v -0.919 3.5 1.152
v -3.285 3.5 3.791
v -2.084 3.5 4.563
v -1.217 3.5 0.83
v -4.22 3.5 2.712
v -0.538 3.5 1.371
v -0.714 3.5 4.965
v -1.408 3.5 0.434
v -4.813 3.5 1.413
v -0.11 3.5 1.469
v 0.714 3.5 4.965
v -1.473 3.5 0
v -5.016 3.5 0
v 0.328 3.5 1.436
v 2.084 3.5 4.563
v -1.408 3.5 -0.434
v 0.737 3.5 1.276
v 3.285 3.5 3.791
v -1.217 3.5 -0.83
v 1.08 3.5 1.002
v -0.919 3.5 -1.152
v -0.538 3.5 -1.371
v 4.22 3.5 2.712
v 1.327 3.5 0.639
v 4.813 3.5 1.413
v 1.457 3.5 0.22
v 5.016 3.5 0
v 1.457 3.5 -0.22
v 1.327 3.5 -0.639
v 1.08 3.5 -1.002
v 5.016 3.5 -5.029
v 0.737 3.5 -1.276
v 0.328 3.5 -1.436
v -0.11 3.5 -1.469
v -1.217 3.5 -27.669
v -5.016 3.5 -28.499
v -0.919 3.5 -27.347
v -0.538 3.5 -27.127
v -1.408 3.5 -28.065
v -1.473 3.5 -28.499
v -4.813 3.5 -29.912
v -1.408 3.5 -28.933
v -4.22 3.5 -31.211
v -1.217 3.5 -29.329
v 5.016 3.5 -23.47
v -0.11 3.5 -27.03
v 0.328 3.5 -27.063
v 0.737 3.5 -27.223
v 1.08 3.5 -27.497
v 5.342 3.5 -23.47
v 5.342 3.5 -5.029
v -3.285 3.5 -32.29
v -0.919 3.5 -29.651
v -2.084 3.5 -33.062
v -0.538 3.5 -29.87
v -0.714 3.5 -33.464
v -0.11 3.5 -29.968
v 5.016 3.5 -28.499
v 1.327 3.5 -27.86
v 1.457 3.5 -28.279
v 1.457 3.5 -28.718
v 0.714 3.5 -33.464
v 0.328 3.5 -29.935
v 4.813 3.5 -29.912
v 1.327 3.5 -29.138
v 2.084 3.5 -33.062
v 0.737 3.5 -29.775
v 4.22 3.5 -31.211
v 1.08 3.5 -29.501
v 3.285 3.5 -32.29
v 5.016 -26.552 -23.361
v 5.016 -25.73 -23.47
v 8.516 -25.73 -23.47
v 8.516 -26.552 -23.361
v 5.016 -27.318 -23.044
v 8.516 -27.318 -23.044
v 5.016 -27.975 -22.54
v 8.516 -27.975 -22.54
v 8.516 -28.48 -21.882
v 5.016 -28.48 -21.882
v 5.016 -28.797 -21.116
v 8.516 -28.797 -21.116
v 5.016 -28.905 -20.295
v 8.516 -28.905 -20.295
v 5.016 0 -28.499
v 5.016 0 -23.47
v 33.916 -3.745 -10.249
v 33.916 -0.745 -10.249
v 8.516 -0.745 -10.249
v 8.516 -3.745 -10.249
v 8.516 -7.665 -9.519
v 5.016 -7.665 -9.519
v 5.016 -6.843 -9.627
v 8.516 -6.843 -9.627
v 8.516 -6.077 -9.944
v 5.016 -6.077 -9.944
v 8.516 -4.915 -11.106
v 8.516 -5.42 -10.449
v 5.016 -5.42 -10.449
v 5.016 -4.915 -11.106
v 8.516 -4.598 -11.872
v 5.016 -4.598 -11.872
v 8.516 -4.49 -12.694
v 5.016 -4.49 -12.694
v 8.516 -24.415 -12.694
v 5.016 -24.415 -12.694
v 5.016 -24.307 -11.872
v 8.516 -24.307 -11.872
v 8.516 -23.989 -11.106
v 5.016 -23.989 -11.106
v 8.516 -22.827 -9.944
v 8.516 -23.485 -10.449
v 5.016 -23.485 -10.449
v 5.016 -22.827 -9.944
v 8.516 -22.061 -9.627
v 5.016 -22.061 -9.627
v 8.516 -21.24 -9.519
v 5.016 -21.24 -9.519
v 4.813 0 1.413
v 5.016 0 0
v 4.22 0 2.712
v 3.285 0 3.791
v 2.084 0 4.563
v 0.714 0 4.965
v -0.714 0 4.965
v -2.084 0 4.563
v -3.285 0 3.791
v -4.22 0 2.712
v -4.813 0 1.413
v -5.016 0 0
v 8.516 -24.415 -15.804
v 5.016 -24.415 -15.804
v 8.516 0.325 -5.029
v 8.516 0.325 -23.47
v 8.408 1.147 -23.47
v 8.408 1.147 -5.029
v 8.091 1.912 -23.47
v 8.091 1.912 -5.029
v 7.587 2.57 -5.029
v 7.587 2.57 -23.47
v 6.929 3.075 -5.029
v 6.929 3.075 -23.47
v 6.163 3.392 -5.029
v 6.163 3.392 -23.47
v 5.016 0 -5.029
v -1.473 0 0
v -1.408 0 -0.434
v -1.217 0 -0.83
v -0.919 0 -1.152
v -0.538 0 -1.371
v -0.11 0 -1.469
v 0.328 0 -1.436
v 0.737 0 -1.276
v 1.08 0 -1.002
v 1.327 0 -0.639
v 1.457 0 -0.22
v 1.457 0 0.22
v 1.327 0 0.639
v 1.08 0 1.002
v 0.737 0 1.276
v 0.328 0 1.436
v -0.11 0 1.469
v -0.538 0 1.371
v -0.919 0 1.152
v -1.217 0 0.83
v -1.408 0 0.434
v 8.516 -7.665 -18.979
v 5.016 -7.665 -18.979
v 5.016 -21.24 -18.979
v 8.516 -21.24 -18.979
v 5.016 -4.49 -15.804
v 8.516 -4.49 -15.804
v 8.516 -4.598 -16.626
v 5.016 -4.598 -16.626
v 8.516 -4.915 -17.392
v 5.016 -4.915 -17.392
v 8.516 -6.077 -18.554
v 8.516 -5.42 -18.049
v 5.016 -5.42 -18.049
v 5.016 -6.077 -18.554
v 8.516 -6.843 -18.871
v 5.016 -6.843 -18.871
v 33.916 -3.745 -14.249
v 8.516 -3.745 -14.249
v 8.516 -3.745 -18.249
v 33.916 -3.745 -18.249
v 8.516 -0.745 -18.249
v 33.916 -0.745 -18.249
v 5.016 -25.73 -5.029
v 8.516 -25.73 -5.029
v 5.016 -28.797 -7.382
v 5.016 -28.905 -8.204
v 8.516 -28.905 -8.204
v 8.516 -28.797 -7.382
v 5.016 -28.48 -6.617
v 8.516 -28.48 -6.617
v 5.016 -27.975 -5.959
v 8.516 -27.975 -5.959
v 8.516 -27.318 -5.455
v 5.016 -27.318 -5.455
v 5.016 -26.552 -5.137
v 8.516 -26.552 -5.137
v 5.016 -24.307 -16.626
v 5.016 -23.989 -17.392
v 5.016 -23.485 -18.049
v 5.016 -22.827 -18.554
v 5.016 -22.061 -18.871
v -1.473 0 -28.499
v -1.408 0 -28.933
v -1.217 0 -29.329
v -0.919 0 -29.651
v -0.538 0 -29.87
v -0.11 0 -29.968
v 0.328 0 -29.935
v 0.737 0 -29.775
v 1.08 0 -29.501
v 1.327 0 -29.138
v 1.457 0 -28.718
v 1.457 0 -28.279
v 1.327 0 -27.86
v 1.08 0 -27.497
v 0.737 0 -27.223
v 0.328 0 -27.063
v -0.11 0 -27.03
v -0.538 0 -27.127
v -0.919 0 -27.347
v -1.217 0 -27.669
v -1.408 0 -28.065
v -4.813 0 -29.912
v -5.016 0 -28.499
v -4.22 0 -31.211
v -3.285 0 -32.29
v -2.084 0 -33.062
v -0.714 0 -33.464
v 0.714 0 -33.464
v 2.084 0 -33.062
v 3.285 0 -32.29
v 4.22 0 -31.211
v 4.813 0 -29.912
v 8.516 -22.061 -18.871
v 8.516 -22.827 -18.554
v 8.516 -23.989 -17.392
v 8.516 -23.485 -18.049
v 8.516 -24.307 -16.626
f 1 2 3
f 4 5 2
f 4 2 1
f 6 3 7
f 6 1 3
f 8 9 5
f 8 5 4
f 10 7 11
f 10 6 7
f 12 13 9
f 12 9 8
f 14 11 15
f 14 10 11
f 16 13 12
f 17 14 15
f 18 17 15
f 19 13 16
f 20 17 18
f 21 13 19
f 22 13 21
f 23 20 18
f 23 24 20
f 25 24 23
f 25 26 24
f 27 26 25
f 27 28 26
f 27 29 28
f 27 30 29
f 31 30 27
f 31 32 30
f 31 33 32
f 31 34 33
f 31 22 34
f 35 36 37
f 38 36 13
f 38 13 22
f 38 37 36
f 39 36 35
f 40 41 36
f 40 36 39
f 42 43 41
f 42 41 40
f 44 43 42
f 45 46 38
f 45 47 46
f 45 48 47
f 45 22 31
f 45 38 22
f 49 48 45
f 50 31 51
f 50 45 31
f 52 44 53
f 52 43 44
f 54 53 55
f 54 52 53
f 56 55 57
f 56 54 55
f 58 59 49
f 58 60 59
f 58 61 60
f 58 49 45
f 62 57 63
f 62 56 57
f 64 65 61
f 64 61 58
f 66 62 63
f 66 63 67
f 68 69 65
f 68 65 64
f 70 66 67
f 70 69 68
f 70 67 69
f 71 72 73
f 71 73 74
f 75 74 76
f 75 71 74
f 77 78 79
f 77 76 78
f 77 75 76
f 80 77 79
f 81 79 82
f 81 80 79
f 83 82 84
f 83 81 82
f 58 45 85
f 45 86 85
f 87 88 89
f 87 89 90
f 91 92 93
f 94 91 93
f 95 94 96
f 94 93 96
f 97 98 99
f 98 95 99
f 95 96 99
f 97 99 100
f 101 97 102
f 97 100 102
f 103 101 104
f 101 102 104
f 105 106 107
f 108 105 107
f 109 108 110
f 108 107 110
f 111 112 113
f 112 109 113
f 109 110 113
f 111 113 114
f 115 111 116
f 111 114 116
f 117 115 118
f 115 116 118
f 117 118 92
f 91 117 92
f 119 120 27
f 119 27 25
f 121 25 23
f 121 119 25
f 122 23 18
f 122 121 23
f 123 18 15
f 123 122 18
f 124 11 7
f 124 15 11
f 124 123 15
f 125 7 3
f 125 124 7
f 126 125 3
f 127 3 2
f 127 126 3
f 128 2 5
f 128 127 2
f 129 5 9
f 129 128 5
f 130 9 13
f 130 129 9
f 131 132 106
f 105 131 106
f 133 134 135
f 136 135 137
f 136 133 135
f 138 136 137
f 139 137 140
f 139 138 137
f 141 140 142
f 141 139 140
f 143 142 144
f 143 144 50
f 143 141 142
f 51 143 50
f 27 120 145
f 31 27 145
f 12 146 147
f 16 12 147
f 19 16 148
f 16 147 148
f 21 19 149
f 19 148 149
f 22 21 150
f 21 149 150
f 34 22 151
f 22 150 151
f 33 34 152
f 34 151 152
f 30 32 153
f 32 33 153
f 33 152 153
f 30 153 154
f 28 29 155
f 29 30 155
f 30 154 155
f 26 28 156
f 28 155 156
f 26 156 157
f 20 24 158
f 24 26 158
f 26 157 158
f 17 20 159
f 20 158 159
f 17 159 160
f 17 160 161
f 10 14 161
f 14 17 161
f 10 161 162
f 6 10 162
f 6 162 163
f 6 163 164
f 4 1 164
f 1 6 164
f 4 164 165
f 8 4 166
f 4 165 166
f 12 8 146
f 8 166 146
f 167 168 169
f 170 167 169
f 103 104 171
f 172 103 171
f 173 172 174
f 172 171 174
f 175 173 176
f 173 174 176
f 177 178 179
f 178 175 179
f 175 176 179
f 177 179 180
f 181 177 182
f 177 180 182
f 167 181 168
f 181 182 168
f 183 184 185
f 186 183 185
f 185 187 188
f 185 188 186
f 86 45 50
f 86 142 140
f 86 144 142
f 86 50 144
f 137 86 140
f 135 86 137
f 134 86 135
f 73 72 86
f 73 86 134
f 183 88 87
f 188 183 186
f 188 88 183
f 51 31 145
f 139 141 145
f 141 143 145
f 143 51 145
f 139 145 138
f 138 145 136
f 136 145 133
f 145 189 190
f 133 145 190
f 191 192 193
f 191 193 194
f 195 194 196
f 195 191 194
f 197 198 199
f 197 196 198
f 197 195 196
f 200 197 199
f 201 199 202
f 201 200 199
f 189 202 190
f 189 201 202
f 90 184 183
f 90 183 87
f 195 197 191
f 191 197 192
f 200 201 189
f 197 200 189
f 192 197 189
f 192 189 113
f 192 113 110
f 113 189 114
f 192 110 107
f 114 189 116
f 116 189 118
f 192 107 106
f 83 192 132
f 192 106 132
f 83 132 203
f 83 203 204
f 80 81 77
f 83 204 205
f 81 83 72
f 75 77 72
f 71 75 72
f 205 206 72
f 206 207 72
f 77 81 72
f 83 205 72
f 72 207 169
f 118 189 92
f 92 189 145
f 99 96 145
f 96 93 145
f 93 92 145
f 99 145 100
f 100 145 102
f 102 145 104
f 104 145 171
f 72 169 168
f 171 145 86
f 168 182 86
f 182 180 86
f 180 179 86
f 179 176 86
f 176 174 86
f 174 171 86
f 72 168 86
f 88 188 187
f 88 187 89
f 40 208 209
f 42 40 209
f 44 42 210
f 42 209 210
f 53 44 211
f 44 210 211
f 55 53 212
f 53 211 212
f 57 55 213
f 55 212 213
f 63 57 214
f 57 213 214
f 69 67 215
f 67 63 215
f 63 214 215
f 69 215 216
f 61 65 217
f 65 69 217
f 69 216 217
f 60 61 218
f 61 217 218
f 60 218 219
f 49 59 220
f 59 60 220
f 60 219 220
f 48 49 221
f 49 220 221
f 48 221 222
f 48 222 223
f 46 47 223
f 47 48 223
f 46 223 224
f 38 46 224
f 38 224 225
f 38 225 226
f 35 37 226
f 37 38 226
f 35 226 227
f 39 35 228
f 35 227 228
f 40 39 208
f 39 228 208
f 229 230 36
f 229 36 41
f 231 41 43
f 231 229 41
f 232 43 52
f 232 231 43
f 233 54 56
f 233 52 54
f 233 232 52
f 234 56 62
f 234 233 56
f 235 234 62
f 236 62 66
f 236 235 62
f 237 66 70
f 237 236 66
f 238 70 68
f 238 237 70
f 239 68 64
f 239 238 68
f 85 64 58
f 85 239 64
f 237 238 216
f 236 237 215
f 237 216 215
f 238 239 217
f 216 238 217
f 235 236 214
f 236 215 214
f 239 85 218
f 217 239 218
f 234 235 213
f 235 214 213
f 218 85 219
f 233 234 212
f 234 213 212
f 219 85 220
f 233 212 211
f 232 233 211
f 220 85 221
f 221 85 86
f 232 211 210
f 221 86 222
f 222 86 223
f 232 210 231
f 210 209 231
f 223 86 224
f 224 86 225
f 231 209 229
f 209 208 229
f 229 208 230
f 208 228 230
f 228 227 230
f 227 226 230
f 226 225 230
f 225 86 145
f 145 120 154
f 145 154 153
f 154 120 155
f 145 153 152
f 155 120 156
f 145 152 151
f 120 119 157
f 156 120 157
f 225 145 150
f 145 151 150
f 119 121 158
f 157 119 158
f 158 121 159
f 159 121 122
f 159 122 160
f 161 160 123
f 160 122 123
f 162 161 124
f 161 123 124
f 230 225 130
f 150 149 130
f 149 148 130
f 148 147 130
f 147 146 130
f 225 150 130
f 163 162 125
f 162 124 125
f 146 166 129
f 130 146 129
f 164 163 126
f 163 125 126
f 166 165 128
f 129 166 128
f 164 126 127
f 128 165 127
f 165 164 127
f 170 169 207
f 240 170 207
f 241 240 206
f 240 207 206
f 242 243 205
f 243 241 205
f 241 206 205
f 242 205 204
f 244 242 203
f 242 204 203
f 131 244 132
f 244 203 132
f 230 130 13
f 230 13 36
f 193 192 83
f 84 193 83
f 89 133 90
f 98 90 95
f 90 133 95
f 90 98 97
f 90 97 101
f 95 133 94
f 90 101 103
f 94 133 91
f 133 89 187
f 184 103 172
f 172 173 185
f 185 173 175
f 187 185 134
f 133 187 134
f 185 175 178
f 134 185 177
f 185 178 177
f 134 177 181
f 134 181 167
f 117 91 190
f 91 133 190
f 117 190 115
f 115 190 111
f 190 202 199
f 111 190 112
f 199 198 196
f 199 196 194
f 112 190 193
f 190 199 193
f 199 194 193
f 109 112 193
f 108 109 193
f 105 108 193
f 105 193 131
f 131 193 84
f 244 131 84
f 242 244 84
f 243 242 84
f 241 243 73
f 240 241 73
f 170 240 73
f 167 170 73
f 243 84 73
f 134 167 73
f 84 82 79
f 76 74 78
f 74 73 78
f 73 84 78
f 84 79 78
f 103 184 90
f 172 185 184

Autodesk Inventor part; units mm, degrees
ref_plane "YZ Plane" through (0, 0, 0) normal (1, 0, 0) x (0, 1, 0)
ref_plane "XZ Plane" through (0, 0, 0) normal (0, 1, 0) x (-1, 0, 0)
ref_plane "XY Plane" through (0, 0, 0) normal (0, 0, 1) x (1, 0, 0)
sketch "Sketch1" plane through (0, 0, 0) normal (0, 1, 0) x (-1, 0, 0)
  circle A0 centre (0, 0) radius 1.4732
  circle A1 centre (0, -28.4988) radius 1.4732
  circle A2 centre (0, 0) radius 5.0165
  circle A3 centre (0, -28.4988) radius 5.0165
  line L0 (5.0165, 0) -> (5.0165, -28.4988)
  line L1 (-5.0165, 0) -> (-5.0165, -28.4988)
  dimension "d0" = 2.9464
  dimension "d2" = 2.9464
  dimension "d3" = 10.033
  dimension "d4" = 10.033
extrude "Extrusion1" add sketch "Sketch1" along normal blind 3.5
sketch "Sketch2" plane through (5.0165, 0, 0) normal (1, 0, 0) x (0, 0, -1)
  line L0 (0, 0) -> (28.4988, 0) projected
  line L1 (0, 0) -> (5.0292, 0)
  line L2 (28.4988, 0) -> (28.4988, 3.5) projected
  line L3 (28.4988, 0) -> (23.4696, 0)
  line L4 (23.4696, 0) -> (5.0292, 0)
  line L5 (5.0292, 0) -> (5.0292, -25.7302)
  line L6 (8.2042, -28.9052) -> (20.2946, -28.9052)
  line L7 (23.4696, -25.7302) -> (23.4696, 0)
  line L8 (5.0292, 0) -> (23.4696, 0)
  line L9 (5.0292, 0) -> (11.3792, 0)
  line L10 (23.4696, 0) -> (17.1196, 0)
  line L11 (5.0292, -28.9052) -> (11.3792, -28.9052)
  arc A0 (5.0292, -25.7302) -> (8.2042, -28.9052) centre (8.2042, -25.7302) ccw
  arc A1 (20.2946, -28.9052) -> (23.4696, -25.7302) centre (20.2946, -25.7302) ccw
  line L12 (15.8041, -24.4147) -> (12.694, -24.4147)
  line L13 (12.694, -4.4898) -> (15.8041, -4.4898)
  line L14 (18.9791, -7.6648) -> (18.9791, -21.2397)
  line L15 (9.519, -21.2397) -> (9.519, -7.6648)
  arc A2 (12.694, -4.4898) -> (9.519, -7.6648) centre (12.694, -7.6648) ccw
  arc A3 (9.519, -21.2397) -> (12.694, -24.4147) centre (12.694, -21.2397) ccw
  arc A4 (15.8041, -24.4147) -> (18.9791, -21.2397) centre (15.8041, -21.2397) ccw
  arc A5 (18.9791, -7.6648) -> (15.8041, -4.4898) centre (15.8041, -7.6648) ccw
  point P0 (9.519, -24.4147)
  dimension "d7" = 5.0292
  dimension "d8" = 5.0292
  dimension "d9" = 28.9052
  dimension "d10" = 6.35
  dimension "d14" = 6.35
  dimension "d17" = 3.175
  dimension "d23" = 6.35
  dimension "d25" = 3.175
extrude "Extrusion4" add sketch "Sketch2" along normal blind 3.5
sketch "Sketch4" plane through (5.0165, 0, -5.0292) normal (0, 1, 0) x (1, 0, 0)
  line L0 (0, 0) -> (3.5, 0) projected
  line L1 (3.5, 15.2654) -> (3.5, 18.4404) projected
  line L2 (3.5, 0) -> (3.5, 18.4404)
  line L3 (0, 18.4404) -> (3.5, 18.4404) projected
  line L4 (3.5, 18.4404) -> (0, 18.4404)
  line L5 (0, 18.4404) -> (0, 0)
  line L6 (0, 0) -> (3.5, 0)
  point P0 (-5.0165, -5.0292)
extrude "Extrusion5" add sketch "Sketch4" along normal blind 3.5
fillet "Fillet3" radius 3.175 1 edges at (8.5165, 3.5, -14.2494)
sketch "Sketch5" plane through (8.5165, 0, 0) normal (1, 0, 0) x (0, 0, -1)
  line L0 (5.0292, 0) -> (23.4696, 0) projected
  line L1 (12.694, -4.4898) -> (15.8041, -4.4898) projected
  line L2 (14.2491, -3.7449) -> (10.2491, -3.7446)
  line L3 (14.2491, -3.7449) -> (18.2491, -3.7449)
  line L4 (14.2493, -0.7449) -> (10.2491, -0.7449)
  line L5 (10.2491, -0.7449) -> (10.2491, -3.7446)
  line L6 (14.2493, -0.7449) -> (18.2491, -0.7449)
  line L7 (18.2491, -0.7449) -> (18.2491, -3.7449)
  point P0 (0, 0)
extrude "Extrusion6" add sketch "Sketch5" along normal blind 25.4
properties part number "frontbackmountpi_3DPrint"
